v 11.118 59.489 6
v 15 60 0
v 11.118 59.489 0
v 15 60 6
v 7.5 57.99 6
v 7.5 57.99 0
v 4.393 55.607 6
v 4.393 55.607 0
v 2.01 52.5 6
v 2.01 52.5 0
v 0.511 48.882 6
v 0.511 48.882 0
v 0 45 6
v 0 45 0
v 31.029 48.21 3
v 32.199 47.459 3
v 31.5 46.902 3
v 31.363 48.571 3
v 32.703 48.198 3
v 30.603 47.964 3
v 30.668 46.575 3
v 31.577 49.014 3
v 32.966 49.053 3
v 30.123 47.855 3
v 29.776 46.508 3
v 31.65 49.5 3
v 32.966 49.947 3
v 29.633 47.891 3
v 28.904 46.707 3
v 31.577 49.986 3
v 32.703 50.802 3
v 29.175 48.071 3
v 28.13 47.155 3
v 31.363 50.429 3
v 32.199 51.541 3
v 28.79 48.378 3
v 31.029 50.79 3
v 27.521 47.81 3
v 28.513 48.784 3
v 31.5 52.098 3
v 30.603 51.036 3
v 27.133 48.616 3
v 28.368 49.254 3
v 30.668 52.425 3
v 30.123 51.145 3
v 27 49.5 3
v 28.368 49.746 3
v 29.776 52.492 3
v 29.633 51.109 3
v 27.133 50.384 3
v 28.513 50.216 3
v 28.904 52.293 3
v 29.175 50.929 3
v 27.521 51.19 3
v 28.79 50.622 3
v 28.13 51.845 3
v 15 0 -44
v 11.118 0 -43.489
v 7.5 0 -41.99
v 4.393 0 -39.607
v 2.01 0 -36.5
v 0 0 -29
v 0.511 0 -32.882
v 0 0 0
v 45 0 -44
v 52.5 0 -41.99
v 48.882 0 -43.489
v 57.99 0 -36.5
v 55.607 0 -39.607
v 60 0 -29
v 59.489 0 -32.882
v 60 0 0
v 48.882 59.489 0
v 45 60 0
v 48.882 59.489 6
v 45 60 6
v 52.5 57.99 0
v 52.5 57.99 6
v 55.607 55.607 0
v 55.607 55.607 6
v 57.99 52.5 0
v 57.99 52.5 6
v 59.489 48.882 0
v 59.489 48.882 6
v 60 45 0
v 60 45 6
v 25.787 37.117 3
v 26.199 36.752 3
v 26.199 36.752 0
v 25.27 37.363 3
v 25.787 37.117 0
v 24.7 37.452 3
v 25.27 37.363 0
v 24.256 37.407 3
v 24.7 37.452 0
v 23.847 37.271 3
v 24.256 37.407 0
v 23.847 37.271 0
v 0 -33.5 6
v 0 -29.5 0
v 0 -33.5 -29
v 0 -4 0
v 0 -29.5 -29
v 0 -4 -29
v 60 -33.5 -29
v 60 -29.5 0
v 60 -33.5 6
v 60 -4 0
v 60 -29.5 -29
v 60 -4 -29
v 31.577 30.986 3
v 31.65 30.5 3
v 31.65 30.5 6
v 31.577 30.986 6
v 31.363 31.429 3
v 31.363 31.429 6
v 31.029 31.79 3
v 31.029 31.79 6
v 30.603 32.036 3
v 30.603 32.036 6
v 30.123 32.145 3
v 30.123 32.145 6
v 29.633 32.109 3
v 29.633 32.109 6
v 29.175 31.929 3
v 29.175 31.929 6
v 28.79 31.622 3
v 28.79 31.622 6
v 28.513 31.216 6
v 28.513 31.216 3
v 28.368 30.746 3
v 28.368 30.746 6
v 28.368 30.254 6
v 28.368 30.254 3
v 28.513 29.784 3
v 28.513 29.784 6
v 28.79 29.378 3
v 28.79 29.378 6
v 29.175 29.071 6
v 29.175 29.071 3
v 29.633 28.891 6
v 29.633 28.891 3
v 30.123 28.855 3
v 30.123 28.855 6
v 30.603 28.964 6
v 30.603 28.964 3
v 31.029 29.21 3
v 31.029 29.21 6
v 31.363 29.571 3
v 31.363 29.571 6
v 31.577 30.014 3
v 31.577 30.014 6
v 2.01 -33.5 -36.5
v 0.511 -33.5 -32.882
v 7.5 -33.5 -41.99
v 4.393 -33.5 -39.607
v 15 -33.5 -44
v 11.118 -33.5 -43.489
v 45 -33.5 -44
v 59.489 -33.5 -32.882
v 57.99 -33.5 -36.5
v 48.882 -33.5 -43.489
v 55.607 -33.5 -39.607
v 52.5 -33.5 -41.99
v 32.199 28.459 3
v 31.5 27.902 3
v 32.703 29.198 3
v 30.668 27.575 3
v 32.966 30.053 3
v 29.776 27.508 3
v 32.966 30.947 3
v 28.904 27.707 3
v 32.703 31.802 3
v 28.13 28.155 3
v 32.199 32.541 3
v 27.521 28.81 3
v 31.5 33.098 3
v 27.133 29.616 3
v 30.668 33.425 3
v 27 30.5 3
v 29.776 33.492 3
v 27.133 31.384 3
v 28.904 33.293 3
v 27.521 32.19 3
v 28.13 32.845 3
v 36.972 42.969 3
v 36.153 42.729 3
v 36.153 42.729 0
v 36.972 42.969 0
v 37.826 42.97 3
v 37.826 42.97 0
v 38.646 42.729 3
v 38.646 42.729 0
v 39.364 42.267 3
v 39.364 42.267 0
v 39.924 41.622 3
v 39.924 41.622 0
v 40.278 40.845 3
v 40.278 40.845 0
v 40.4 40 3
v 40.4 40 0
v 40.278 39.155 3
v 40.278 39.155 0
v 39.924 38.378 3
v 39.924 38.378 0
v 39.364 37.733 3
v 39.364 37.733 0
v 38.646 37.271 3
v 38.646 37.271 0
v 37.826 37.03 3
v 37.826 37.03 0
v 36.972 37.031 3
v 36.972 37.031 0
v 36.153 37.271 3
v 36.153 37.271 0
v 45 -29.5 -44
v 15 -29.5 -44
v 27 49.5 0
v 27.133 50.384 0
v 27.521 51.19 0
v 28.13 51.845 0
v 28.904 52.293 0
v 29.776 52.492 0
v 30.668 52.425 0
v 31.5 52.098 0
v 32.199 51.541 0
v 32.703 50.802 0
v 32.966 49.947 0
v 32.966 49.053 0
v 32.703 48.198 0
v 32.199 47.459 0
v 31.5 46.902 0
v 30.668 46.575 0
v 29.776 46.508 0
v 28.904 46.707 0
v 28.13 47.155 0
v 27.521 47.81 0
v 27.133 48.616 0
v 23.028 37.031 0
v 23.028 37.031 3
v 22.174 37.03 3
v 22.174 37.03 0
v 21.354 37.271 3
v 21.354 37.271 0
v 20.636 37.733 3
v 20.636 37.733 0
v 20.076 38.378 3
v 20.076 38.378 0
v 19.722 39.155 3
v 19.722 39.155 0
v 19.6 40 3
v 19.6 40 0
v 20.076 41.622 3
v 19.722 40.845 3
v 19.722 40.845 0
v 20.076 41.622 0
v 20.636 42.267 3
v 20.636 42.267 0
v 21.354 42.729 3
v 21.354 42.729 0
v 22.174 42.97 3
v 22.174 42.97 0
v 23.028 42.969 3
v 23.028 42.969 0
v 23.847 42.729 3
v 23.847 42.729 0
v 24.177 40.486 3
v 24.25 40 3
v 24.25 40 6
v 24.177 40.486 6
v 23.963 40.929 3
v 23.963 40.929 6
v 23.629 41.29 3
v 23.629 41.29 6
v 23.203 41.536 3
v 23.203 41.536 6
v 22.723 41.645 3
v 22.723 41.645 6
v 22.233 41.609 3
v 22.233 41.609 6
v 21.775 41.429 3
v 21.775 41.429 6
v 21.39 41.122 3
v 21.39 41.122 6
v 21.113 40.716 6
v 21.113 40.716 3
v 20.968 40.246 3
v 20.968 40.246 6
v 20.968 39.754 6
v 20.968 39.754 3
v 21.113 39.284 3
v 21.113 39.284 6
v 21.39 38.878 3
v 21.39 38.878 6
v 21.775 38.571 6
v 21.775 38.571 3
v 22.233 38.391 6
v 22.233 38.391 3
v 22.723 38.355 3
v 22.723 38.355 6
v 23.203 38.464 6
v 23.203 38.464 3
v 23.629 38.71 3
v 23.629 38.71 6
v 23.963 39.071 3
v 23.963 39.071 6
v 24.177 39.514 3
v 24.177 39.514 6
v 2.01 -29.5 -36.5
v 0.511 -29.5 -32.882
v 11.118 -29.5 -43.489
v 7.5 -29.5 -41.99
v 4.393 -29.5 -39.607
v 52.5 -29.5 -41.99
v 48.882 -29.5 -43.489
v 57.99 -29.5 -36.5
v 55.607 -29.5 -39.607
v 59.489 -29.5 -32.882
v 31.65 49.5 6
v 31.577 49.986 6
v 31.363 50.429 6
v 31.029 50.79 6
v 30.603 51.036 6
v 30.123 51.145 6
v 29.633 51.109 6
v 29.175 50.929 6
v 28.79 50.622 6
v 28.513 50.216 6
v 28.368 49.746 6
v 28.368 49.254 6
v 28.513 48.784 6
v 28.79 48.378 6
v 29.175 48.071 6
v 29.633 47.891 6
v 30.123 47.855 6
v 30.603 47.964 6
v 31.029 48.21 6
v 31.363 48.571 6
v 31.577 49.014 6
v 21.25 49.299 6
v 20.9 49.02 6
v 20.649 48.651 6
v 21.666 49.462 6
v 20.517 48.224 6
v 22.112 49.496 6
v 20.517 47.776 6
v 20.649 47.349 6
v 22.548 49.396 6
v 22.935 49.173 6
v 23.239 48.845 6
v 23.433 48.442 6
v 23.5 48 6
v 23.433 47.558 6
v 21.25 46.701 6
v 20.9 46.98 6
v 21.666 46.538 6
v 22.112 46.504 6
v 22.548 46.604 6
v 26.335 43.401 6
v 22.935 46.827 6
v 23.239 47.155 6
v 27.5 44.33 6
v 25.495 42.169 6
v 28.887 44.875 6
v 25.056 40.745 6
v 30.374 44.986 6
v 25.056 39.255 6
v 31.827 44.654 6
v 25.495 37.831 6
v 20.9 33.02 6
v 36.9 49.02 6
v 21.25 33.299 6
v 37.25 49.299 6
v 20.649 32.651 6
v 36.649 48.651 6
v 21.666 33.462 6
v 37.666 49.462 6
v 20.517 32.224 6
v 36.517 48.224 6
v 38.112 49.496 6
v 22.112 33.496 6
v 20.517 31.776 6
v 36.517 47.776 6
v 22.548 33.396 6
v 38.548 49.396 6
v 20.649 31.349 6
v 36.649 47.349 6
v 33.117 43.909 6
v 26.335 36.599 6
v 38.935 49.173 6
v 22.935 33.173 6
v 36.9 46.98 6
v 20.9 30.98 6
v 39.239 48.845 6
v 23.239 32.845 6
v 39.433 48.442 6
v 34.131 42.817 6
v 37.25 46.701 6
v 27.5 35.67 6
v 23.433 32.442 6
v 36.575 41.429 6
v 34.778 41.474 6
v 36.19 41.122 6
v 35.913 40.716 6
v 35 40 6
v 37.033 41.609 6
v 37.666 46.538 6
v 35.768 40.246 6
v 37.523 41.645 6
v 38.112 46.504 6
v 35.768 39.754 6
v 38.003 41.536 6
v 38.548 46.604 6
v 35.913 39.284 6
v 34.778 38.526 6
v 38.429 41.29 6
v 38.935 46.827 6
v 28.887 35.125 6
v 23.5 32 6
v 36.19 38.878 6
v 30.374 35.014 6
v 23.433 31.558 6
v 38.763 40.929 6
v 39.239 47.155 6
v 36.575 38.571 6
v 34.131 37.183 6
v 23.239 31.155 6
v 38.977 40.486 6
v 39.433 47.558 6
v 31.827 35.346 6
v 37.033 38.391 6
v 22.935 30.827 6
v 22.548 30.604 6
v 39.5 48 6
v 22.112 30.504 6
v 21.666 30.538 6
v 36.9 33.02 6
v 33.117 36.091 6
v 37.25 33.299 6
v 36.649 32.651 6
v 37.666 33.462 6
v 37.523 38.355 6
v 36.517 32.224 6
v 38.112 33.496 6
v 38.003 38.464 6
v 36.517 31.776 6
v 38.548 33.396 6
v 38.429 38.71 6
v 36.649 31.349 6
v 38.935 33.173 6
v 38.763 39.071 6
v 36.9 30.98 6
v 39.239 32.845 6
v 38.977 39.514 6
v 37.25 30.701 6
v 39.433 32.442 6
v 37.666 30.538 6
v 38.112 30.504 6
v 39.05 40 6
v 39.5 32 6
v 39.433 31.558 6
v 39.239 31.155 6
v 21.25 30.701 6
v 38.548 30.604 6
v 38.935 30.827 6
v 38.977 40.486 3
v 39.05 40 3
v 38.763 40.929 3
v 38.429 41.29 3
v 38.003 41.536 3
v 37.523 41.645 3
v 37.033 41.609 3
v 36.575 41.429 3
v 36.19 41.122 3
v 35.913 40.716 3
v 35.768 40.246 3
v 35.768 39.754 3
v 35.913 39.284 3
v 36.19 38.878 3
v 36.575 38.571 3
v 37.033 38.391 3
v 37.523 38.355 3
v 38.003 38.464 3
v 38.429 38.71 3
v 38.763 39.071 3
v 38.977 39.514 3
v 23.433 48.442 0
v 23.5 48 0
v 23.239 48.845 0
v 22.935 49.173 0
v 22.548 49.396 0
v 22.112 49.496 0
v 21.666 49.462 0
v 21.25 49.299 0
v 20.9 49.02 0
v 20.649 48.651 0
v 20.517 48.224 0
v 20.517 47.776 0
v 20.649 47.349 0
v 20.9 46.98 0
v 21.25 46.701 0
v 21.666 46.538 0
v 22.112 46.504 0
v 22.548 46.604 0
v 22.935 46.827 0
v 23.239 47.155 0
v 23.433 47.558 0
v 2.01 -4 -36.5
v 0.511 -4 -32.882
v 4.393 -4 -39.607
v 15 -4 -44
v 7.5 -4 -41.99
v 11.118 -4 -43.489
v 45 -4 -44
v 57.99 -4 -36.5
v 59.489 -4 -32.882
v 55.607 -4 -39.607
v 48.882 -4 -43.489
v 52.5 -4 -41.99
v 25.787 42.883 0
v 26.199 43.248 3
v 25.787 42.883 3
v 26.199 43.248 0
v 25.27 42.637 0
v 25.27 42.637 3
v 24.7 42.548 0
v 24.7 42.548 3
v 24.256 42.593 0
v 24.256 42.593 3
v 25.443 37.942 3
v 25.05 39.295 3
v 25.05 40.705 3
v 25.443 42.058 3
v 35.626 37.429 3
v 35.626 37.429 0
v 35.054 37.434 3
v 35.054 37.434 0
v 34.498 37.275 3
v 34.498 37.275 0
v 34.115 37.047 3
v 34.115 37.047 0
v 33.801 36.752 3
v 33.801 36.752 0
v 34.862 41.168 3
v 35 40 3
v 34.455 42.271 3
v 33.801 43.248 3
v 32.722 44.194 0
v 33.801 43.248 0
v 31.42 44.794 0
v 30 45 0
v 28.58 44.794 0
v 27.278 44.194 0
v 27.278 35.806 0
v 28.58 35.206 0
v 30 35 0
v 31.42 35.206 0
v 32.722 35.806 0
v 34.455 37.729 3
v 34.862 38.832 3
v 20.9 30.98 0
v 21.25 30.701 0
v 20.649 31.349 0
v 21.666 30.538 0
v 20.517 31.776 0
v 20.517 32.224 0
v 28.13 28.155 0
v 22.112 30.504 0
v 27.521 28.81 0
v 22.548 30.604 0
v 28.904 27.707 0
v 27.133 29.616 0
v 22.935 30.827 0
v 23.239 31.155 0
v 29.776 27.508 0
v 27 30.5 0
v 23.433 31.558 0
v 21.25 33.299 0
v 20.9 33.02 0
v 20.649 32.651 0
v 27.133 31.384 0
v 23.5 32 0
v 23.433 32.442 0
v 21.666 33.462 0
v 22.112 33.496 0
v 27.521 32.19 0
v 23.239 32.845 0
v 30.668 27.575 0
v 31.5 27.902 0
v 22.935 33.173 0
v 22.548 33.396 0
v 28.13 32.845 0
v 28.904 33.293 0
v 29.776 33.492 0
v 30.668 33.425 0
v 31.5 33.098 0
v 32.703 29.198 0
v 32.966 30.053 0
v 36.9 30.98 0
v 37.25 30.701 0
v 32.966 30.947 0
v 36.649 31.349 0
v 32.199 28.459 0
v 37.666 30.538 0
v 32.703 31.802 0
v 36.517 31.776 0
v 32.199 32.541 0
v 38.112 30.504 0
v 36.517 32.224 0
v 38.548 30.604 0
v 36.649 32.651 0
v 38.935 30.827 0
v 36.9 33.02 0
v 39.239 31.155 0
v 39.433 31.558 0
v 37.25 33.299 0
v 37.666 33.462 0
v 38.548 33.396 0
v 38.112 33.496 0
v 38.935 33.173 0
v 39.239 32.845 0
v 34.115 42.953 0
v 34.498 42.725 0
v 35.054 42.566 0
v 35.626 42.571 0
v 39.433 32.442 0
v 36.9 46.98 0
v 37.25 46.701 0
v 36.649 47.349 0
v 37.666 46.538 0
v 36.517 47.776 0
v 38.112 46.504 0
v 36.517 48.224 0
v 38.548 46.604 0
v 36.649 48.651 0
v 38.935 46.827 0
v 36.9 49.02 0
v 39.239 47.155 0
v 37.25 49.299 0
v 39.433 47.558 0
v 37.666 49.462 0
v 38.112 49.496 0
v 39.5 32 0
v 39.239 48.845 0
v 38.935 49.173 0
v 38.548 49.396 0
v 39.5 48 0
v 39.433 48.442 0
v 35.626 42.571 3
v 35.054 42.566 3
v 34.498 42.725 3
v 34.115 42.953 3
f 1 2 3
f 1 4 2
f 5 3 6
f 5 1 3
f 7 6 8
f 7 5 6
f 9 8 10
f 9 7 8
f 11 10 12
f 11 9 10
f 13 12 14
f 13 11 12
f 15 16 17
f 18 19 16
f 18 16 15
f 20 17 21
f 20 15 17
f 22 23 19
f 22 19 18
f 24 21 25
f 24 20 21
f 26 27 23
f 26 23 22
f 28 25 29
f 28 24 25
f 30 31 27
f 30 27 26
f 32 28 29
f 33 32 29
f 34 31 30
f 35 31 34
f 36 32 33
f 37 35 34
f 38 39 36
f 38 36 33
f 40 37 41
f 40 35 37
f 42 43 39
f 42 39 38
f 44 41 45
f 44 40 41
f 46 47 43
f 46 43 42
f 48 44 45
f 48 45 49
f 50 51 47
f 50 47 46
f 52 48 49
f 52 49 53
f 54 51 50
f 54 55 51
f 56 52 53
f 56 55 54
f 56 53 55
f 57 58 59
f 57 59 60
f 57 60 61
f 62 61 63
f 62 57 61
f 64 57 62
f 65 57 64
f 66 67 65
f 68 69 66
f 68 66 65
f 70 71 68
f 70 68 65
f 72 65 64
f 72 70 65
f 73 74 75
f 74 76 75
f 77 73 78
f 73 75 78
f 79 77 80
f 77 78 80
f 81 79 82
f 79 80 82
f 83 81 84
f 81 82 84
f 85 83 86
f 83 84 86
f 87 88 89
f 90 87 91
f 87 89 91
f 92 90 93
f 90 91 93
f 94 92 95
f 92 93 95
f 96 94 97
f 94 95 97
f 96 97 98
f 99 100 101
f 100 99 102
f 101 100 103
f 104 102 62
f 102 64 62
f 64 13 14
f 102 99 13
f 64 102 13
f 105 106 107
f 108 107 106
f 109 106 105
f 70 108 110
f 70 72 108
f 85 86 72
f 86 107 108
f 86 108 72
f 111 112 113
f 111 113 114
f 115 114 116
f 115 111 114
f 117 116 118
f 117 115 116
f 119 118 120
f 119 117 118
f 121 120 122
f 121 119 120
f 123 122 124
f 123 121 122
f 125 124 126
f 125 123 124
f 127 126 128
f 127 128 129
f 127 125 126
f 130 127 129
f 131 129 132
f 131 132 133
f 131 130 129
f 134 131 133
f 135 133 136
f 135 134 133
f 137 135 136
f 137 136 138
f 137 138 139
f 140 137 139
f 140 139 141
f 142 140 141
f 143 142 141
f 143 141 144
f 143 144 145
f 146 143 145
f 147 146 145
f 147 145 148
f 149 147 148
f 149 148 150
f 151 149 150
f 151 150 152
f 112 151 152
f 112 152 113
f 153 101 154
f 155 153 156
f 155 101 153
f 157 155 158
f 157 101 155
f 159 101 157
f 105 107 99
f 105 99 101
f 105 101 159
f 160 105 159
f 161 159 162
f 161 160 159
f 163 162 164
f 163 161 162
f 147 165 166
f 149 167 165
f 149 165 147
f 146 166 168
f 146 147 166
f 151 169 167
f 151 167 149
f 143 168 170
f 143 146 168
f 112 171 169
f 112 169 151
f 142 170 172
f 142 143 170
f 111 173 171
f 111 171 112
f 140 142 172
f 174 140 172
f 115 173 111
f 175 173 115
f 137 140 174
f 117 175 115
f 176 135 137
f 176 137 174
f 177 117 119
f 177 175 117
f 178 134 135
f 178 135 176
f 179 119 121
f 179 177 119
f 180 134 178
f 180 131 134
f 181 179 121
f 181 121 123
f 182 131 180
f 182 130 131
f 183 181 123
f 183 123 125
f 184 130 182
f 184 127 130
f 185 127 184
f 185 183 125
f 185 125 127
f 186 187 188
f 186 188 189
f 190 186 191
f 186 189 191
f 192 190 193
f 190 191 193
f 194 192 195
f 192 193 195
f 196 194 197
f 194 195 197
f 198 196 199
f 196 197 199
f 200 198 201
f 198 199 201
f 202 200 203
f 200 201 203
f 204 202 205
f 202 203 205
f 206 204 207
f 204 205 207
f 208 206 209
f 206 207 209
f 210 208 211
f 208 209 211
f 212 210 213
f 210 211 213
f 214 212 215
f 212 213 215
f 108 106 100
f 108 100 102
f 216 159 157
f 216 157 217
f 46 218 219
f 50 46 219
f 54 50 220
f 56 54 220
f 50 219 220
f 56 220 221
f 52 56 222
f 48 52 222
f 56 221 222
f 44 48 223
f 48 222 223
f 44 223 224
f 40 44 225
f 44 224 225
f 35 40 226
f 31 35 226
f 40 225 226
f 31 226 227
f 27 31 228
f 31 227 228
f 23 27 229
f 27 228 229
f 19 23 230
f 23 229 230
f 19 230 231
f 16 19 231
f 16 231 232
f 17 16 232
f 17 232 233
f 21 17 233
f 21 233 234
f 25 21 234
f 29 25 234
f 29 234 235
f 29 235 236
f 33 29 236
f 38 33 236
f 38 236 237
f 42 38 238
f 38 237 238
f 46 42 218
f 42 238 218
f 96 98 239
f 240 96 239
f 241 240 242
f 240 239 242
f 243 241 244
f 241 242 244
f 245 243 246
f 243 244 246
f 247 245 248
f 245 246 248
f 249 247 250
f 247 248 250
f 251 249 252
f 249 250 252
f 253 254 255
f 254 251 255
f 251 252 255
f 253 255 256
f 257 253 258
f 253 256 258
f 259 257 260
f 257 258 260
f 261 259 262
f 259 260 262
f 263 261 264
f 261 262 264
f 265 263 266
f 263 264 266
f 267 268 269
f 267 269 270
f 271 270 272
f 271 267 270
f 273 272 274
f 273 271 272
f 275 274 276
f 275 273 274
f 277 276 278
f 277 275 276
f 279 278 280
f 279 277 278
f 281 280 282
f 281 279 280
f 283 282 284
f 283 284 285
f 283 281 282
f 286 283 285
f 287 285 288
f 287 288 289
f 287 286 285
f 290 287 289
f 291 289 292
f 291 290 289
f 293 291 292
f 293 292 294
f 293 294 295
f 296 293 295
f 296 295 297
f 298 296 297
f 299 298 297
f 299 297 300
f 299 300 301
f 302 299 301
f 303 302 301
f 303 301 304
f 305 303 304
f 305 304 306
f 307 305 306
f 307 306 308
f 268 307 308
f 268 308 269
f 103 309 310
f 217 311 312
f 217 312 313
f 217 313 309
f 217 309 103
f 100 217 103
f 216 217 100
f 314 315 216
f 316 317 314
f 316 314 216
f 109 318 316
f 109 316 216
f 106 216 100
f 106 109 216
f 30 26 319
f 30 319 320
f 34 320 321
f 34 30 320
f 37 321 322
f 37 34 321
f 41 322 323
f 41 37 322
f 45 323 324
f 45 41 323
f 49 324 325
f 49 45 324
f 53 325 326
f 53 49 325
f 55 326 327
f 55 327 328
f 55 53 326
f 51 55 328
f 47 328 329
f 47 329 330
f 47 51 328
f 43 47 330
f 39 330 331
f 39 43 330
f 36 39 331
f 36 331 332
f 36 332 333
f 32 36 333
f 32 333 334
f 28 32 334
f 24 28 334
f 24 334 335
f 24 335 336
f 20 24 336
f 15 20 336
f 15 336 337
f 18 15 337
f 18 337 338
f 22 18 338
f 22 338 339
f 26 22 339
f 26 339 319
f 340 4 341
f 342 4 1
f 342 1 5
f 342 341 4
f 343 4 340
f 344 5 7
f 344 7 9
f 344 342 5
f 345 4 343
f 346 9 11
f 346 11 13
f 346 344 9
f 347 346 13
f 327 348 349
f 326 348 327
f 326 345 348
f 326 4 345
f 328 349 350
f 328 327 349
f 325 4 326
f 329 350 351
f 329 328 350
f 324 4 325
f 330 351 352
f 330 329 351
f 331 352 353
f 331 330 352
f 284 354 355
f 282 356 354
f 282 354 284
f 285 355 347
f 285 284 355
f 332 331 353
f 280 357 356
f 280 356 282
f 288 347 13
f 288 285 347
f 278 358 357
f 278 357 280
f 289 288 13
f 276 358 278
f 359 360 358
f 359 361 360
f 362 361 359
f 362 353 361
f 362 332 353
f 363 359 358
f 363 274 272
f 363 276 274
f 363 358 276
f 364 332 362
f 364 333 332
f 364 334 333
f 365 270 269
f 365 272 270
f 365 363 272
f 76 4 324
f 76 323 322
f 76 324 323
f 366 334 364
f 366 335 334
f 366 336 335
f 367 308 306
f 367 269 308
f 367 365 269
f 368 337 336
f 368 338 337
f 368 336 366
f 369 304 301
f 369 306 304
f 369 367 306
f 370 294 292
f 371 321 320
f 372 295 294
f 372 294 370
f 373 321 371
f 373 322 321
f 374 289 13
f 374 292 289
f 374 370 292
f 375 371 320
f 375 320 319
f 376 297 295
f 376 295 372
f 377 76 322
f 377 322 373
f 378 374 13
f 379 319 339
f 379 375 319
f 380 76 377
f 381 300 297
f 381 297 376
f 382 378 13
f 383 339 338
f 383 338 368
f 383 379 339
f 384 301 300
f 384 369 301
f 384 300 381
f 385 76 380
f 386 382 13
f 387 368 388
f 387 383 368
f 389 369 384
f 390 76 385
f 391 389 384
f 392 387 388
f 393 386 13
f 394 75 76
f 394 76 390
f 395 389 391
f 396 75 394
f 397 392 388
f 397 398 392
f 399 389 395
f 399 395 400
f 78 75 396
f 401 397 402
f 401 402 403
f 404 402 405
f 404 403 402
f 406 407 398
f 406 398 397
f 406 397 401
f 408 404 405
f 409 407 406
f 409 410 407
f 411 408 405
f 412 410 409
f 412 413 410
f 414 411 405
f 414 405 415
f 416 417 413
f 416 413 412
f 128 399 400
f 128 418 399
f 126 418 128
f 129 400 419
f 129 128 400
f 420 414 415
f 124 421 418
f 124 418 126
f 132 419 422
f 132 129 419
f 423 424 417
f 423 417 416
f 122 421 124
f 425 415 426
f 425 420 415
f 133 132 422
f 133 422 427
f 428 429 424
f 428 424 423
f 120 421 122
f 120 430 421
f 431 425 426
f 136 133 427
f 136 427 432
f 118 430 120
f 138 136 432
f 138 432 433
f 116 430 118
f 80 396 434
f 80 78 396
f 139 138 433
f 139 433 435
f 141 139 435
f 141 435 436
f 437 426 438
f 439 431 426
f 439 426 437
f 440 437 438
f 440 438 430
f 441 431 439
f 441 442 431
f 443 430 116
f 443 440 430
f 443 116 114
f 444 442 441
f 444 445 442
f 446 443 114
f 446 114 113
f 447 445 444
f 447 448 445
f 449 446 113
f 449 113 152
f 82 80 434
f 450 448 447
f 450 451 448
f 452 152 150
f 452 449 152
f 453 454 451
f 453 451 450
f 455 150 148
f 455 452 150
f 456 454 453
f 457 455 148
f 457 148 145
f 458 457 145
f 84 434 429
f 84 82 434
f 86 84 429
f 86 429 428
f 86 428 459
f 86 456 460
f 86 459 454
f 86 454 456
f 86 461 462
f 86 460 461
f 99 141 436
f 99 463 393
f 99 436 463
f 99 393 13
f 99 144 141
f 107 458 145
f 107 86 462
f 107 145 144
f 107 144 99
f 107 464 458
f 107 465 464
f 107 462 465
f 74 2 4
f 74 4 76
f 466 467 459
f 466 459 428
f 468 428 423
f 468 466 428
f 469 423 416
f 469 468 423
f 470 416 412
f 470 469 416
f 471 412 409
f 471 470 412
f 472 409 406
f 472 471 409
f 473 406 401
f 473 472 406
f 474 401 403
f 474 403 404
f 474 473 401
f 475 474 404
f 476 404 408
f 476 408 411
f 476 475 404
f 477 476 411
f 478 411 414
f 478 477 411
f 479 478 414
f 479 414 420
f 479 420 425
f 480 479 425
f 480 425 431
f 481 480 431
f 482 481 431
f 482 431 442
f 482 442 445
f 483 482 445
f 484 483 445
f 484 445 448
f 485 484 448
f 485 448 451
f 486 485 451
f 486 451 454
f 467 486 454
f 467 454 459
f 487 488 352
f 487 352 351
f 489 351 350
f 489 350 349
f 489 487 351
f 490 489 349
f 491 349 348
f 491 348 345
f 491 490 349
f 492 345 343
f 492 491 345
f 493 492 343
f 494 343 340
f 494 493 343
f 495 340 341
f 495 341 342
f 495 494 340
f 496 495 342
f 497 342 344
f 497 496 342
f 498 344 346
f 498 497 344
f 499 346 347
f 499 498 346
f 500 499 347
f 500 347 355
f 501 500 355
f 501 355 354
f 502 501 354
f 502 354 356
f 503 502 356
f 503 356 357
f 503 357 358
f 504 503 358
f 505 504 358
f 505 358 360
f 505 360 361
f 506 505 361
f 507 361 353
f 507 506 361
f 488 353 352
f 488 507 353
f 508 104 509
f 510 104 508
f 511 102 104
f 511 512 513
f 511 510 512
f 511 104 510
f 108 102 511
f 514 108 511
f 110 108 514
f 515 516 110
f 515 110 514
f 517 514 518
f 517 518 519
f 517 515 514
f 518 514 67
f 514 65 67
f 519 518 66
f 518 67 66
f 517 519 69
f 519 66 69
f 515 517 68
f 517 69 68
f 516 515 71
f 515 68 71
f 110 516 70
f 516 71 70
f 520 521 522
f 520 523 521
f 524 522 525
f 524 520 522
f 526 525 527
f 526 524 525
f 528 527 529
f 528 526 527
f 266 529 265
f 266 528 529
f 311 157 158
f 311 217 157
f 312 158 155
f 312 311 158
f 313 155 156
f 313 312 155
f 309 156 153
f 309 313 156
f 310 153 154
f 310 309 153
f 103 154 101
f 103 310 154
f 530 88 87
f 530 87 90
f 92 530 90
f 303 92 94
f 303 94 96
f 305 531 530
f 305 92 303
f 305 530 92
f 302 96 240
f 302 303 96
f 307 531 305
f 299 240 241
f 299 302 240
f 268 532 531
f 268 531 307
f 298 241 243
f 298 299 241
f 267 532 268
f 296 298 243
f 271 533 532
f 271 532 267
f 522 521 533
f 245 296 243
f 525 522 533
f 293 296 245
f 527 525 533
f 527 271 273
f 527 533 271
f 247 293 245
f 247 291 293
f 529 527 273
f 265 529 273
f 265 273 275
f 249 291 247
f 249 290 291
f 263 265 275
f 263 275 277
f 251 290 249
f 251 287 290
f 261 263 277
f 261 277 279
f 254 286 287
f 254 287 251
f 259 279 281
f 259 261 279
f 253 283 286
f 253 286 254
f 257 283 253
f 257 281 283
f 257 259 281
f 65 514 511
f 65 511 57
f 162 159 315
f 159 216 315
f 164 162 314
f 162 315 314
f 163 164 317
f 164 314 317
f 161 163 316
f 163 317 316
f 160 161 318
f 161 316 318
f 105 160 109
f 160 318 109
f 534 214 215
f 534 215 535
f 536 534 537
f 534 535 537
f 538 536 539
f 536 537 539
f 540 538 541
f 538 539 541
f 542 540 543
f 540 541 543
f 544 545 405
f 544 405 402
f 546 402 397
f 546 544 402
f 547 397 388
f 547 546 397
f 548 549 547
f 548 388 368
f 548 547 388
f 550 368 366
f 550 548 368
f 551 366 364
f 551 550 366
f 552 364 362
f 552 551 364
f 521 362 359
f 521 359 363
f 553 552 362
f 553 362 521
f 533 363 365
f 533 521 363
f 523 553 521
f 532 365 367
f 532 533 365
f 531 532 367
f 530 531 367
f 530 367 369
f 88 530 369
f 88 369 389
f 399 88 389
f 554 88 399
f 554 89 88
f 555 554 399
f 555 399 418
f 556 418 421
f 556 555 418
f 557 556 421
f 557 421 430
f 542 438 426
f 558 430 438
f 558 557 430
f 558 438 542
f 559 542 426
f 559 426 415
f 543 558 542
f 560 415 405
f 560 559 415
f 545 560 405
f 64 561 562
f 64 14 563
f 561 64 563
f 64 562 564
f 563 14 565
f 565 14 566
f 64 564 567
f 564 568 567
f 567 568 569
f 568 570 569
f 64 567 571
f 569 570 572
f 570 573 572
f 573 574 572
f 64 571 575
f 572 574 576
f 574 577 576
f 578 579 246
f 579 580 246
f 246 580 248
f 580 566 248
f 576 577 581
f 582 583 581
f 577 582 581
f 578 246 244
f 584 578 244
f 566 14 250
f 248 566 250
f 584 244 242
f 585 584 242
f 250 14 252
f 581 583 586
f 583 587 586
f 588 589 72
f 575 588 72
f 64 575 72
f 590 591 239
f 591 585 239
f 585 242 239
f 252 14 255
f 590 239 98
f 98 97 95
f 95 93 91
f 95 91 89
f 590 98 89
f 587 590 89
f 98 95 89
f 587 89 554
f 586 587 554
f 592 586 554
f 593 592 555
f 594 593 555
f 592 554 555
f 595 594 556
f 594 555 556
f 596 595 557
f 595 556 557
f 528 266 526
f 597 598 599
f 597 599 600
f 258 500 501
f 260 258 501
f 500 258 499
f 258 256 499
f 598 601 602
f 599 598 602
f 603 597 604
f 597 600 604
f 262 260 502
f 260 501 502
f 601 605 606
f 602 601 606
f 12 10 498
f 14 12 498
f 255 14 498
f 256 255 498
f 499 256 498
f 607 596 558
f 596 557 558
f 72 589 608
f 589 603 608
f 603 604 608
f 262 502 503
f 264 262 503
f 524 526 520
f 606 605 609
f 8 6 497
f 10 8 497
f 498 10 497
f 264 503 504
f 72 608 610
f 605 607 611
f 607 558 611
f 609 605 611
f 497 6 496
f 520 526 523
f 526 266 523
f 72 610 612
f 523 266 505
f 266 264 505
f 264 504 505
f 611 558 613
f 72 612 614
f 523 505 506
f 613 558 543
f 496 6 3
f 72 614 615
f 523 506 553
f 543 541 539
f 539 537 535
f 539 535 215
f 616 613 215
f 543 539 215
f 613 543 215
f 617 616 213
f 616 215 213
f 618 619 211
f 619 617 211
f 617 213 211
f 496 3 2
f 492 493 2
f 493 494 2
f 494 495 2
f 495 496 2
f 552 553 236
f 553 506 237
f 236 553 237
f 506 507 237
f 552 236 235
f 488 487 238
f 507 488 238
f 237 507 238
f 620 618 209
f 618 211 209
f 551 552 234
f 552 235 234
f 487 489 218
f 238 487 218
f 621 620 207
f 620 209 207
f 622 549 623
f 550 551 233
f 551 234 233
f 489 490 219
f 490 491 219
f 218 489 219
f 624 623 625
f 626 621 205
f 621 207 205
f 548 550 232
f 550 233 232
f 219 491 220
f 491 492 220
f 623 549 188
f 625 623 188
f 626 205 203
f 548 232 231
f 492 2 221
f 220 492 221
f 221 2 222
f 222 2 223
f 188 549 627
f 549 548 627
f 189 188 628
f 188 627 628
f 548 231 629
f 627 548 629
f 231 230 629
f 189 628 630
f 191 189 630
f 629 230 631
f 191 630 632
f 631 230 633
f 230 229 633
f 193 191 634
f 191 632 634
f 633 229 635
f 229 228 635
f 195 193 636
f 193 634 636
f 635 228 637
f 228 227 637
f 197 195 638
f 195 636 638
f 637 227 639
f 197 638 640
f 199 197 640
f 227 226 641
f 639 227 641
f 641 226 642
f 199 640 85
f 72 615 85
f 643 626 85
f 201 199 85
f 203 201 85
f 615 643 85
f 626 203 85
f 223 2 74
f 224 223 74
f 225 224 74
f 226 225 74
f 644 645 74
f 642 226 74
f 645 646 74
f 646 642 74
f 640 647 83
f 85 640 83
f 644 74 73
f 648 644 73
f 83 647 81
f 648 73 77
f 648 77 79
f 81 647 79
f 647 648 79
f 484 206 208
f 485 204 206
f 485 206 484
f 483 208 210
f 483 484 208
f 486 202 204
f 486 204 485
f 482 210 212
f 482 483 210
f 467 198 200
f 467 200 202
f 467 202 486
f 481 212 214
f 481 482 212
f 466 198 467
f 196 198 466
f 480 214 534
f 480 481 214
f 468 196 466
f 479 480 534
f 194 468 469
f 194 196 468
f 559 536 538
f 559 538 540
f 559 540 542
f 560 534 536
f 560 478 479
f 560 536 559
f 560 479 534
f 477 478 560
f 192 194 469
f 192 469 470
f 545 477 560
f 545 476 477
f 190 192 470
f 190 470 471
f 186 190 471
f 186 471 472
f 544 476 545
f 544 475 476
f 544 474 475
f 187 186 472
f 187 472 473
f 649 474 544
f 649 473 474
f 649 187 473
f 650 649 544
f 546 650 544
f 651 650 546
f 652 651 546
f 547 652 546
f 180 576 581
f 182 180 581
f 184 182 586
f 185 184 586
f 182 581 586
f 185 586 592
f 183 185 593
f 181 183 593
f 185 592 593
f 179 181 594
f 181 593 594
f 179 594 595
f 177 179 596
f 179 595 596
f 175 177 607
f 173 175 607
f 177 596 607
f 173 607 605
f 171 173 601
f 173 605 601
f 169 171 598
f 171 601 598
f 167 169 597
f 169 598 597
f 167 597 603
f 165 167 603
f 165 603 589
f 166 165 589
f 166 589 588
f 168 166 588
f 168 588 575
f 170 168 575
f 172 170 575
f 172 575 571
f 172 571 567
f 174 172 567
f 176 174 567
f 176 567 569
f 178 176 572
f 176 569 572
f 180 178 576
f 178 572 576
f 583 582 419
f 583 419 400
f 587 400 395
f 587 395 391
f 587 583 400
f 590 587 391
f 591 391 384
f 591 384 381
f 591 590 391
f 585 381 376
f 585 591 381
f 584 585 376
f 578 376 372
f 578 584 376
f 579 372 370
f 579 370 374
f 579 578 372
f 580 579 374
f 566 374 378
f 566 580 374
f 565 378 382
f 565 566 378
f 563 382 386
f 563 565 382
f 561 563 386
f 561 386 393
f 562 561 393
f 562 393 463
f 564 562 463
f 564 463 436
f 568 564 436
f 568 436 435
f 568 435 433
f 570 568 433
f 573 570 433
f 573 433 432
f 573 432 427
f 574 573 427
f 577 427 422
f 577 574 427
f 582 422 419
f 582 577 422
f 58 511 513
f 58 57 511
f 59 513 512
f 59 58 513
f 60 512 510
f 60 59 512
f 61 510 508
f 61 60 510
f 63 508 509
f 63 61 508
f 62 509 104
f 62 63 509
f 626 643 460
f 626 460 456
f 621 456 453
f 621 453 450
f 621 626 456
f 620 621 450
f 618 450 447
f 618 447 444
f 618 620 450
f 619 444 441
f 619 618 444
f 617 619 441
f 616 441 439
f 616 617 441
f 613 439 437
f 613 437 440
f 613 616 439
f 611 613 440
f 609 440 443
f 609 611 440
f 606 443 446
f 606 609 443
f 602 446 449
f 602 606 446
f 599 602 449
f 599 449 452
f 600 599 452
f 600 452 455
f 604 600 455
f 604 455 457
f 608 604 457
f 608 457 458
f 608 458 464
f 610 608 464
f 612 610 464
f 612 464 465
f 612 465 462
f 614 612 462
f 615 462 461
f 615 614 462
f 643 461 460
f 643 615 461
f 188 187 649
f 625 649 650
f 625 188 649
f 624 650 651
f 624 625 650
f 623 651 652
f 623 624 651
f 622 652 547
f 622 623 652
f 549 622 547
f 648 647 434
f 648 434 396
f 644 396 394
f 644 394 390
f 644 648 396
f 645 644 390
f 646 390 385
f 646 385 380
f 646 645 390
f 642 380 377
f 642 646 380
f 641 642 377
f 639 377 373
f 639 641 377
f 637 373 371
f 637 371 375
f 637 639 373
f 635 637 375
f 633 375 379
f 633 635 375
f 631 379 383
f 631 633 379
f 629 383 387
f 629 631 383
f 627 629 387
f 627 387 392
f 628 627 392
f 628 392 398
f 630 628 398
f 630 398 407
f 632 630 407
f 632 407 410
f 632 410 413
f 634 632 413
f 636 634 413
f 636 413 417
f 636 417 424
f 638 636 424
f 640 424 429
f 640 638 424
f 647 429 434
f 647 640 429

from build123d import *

# Parameters (mm, degrees)
SKETCH1_W           = 60
SKETCH1_H           = 60
SKETCH1_R           = 5
SKETCH1_R_2         = 1.65
SKETCH1_R_3         = 1.5
BOSS_EXTRUDE1_DEPTH = 6
SKETCH2_W           = 6
SKETCH2_H           = 25.5
BOSS_EXTRUDE2_DEPTH = 60
FILLET1_R           = 15
SKETCH3_R           = 3
CUT_EXTRUDE1_DEPTH  = 3
FILLET2_R           = 2


with BuildPart() as part:
    # Sketch1 → Boss-Extrude1 (new body)
    with BuildSketch(Plane.XY):
        with Locations((30, 30)):
            Rectangle(SKETCH1_W, SKETCH1_H)
        with Locations((30, 40)):
            Circle(SKETCH1_R, mode=Mode.SUBTRACT)
        with Locations((30, 49.5)):
            Circle(SKETCH1_R_2, mode=Mode.SUBTRACT)
        with Locations((30, 30.5)):
            Circle(SKETCH1_R_2, mode=Mode.SUBTRACT)
        with Locations((22.6, 40)):
            Circle(SKETCH1_R_2, mode=Mode.SUBTRACT)
        with Locations((37.4, 40)):
            Circle(SKETCH1_R_2, mode=Mode.SUBTRACT)
        with Locations((22, 48)):
            Circle(SKETCH1_R_3, mode=Mode.SUBTRACT)
        with Locations((38, 48)):
            Circle(SKETCH1_R_3, mode=Mode.SUBTRACT)
        with Locations((38, 32)):
            Circle(SKETCH1_R_3, mode=Mode.SUBTRACT)
        with Locations((22, 32)):
            Circle(SKETCH1_R_3, mode=Mode.SUBTRACT)
    extrude(amount=BOSS_EXTRUDE1_DEPTH)

    # Sketch2 → Boss-Extrude2 (add)
    with BuildSketch(Plane(origin=(60, 0, 0), x_dir=(0, 0, -1), z_dir=(1, 0, 0))):
        Polygon((44, 0), (-6, 0), (-6, -4), (0, -4), (44, -4), align=None)
        with Locations((-3, -16.75)):
            Rectangle(SKETCH2_W, SKETCH2_H)
        Polygon((0, -29.5), (-6, -29.5), (-6, -33.5), (44, -33.5), (44, -29.5), align=None)
    extrude(amount=-BOSS_EXTRUDE2_DEPTH)

    # Fillet1
    fillet1_edges = [part.edges().sort_by_distance(p)[0] for p in [
        (60, -2, -44),
        (0, -31.5, -44),
        (0, -2, -44),
        (60, -31.5, -44),
        (0, 60, 3),
        (60, 60, 3),
    ]]
    fillet(fillet1_edges, radius=FILLET1_R)

    # Sketch3 → Cut-Extrude1 (cut)
    with BuildSketch(Plane(origin=(0, 0, 0), x_dir=(-1, 0, 0), z_dir=(0, 0, -1))):
        with Locations((-30, 49.5)):
            Circle(SKETCH3_R)
        with Locations((-22.6, 40)):
            Circle(SKETCH3_R)
        with Locations((-30, 30.5)):
            Circle(SKETCH3_R)
        with Locations((-37.4, 40)):
            Circle(SKETCH3_R)
    extrude(amount=-CUT_EXTRUDE1_DEPTH, mode=Mode.SUBTRACT)

    # Fillet2
    fillet2_edges = [part.edges().sort_by_distance(p)[0] for p in [
        (34.781081081, 41.463305743, 1.5),
        (34.781081081, 38.536694257, 1.5),
        (25.218918919, 38.536694257, 1.5),
        (25.218918919, 41.463305743, 1.5),
    ]]
    fillet(fillet2_edges, radius=FILLET2_R)


solid = part.part
